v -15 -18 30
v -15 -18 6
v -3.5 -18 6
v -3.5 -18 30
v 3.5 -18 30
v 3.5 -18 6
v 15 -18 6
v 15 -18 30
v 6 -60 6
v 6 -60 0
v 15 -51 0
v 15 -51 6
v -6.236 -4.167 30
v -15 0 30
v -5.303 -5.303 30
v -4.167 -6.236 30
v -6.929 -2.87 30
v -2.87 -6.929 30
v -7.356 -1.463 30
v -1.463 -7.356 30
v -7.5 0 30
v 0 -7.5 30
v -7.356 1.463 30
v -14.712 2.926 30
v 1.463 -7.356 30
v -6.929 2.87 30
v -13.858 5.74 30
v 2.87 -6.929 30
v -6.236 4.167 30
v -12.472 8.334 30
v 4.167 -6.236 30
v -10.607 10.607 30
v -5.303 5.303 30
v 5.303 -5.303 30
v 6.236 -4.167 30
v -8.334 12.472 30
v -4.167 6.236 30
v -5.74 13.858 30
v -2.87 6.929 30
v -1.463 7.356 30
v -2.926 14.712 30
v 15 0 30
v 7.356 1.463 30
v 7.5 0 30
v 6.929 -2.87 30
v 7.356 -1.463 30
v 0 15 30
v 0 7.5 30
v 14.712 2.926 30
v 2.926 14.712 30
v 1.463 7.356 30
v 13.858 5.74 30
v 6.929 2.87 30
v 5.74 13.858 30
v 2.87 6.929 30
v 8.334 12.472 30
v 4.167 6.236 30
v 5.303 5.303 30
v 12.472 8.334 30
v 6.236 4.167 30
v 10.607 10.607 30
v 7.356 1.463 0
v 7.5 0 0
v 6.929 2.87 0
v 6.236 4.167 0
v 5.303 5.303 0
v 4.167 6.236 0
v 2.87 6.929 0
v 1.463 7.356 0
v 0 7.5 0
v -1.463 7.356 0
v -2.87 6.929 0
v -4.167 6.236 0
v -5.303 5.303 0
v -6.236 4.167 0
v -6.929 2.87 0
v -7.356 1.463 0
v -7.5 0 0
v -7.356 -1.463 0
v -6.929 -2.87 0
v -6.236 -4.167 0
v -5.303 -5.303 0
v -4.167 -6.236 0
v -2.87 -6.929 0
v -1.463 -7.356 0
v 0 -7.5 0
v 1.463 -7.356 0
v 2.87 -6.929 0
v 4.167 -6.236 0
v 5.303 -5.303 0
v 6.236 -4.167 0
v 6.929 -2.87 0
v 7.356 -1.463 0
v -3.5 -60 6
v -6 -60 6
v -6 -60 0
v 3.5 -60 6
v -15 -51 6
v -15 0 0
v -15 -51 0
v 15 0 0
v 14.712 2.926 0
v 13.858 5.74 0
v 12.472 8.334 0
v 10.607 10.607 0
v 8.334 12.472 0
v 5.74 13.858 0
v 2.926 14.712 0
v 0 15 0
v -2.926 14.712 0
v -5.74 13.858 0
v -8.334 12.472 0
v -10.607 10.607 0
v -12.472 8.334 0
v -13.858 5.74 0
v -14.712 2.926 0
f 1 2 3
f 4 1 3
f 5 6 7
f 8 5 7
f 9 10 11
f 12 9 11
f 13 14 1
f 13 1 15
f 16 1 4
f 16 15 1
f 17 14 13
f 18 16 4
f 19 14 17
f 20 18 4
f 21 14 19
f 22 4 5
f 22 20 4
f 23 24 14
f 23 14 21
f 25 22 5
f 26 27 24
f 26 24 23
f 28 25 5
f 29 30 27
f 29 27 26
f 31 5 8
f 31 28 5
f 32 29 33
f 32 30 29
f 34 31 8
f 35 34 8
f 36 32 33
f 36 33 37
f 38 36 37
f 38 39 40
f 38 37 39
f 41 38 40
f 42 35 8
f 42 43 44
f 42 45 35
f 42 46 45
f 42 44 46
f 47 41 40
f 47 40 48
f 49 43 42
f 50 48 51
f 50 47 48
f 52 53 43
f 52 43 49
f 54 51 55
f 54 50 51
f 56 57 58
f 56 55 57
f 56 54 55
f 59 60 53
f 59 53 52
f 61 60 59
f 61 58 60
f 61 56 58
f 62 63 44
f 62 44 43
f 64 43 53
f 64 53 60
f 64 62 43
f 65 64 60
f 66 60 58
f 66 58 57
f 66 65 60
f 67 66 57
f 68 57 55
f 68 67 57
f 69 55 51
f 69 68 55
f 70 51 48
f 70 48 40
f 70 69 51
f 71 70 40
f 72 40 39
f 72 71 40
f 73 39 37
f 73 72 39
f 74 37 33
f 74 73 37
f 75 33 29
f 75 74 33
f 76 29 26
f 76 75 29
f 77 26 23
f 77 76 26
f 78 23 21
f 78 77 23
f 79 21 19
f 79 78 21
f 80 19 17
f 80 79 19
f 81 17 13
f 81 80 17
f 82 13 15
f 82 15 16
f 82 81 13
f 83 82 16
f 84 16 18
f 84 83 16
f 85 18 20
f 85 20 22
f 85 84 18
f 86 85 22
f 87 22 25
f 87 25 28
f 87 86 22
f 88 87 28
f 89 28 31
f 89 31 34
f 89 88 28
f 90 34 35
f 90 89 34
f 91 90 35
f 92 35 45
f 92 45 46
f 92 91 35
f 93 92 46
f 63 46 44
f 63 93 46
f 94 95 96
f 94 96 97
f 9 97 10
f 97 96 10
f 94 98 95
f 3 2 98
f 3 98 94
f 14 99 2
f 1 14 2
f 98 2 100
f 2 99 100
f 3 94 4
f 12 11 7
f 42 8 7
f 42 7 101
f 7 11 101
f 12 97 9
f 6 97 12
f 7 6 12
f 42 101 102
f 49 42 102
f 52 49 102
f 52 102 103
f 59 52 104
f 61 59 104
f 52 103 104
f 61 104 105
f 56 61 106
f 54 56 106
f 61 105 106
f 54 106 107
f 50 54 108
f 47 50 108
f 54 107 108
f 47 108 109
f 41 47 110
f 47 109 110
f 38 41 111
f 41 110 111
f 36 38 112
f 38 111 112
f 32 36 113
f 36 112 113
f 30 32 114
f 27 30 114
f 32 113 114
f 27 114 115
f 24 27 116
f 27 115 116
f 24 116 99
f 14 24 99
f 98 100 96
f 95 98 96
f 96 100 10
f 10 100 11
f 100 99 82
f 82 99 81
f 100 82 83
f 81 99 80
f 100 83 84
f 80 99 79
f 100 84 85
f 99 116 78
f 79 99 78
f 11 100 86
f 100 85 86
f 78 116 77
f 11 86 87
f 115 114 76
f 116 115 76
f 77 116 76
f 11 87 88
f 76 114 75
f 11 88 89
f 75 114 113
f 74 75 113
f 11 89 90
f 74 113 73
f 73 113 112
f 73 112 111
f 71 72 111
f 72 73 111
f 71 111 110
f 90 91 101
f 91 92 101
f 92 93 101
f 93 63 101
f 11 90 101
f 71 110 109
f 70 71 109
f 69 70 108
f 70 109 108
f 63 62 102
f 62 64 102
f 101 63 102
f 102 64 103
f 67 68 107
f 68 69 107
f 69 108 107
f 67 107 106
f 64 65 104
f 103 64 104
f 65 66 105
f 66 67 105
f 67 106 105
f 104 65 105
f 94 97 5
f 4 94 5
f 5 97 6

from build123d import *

# Parameters (mm, degrees)
F0_R     = 7.5
F1_DEPTH = 30
F0_W     = 7
F0_H     = 42
F2_DEPTH = 6
F3_W     = 7
F3_H     = 42
F4_DEPTH = 24
F6_DEPTH = 18.501


with BuildPart() as f1:
    # F0 (on Top) → F1 (new body)
    with BuildSketch(Plane.XY):
        with BuildLine():
            Line((15, -18), (15, 0))
            ThreePointArc((15, 0), (0, 15), (-15, 0))
            Line((-15, 0), (-15, -18))
            Line((-15, -18), (-3.5, -18))
            Line((-3.5, -18), (3.5, -18))
            Line((3.5, -18), (15, -18))
        make_face()
        Circle(F0_R, mode=Mode.SUBTRACT)
    extrude(amount=F1_DEPTH)

    # F0 (on Top) → F2 (join)
    with BuildSketch(Plane.XY):
        Polygon((15, -51), (15, -18), (3.5, -18), (3.5, -60), (6, -60), align=None)
        with Locations((0, -39)):
            Rectangle(F0_W, F0_H)
        Polygon((-3.5, -18), (-15, -18), (-15, -51), (-6, -60), (-3.5, -60), align=None)
    extrude(amount=F2_DEPTH)

    # F3 (on face) → F4 (join)
    with BuildSketch(Plane.XY.offset(6)):
        with Locations((0, -39)):
            Rectangle(F3_W, F3_H)
    extrude(amount=F4_DEPTH)

    # F5 (on face) → F6 (cut, through all)
    with BuildSketch(Plane.YZ.offset(3.5)):
        Polygon((-60, 30), (-60, 6), (-18, 30), align=None)
    extrude(amount=-F6_DEPTH, mode=Mode.SUBTRACT)


solid = f1.part
